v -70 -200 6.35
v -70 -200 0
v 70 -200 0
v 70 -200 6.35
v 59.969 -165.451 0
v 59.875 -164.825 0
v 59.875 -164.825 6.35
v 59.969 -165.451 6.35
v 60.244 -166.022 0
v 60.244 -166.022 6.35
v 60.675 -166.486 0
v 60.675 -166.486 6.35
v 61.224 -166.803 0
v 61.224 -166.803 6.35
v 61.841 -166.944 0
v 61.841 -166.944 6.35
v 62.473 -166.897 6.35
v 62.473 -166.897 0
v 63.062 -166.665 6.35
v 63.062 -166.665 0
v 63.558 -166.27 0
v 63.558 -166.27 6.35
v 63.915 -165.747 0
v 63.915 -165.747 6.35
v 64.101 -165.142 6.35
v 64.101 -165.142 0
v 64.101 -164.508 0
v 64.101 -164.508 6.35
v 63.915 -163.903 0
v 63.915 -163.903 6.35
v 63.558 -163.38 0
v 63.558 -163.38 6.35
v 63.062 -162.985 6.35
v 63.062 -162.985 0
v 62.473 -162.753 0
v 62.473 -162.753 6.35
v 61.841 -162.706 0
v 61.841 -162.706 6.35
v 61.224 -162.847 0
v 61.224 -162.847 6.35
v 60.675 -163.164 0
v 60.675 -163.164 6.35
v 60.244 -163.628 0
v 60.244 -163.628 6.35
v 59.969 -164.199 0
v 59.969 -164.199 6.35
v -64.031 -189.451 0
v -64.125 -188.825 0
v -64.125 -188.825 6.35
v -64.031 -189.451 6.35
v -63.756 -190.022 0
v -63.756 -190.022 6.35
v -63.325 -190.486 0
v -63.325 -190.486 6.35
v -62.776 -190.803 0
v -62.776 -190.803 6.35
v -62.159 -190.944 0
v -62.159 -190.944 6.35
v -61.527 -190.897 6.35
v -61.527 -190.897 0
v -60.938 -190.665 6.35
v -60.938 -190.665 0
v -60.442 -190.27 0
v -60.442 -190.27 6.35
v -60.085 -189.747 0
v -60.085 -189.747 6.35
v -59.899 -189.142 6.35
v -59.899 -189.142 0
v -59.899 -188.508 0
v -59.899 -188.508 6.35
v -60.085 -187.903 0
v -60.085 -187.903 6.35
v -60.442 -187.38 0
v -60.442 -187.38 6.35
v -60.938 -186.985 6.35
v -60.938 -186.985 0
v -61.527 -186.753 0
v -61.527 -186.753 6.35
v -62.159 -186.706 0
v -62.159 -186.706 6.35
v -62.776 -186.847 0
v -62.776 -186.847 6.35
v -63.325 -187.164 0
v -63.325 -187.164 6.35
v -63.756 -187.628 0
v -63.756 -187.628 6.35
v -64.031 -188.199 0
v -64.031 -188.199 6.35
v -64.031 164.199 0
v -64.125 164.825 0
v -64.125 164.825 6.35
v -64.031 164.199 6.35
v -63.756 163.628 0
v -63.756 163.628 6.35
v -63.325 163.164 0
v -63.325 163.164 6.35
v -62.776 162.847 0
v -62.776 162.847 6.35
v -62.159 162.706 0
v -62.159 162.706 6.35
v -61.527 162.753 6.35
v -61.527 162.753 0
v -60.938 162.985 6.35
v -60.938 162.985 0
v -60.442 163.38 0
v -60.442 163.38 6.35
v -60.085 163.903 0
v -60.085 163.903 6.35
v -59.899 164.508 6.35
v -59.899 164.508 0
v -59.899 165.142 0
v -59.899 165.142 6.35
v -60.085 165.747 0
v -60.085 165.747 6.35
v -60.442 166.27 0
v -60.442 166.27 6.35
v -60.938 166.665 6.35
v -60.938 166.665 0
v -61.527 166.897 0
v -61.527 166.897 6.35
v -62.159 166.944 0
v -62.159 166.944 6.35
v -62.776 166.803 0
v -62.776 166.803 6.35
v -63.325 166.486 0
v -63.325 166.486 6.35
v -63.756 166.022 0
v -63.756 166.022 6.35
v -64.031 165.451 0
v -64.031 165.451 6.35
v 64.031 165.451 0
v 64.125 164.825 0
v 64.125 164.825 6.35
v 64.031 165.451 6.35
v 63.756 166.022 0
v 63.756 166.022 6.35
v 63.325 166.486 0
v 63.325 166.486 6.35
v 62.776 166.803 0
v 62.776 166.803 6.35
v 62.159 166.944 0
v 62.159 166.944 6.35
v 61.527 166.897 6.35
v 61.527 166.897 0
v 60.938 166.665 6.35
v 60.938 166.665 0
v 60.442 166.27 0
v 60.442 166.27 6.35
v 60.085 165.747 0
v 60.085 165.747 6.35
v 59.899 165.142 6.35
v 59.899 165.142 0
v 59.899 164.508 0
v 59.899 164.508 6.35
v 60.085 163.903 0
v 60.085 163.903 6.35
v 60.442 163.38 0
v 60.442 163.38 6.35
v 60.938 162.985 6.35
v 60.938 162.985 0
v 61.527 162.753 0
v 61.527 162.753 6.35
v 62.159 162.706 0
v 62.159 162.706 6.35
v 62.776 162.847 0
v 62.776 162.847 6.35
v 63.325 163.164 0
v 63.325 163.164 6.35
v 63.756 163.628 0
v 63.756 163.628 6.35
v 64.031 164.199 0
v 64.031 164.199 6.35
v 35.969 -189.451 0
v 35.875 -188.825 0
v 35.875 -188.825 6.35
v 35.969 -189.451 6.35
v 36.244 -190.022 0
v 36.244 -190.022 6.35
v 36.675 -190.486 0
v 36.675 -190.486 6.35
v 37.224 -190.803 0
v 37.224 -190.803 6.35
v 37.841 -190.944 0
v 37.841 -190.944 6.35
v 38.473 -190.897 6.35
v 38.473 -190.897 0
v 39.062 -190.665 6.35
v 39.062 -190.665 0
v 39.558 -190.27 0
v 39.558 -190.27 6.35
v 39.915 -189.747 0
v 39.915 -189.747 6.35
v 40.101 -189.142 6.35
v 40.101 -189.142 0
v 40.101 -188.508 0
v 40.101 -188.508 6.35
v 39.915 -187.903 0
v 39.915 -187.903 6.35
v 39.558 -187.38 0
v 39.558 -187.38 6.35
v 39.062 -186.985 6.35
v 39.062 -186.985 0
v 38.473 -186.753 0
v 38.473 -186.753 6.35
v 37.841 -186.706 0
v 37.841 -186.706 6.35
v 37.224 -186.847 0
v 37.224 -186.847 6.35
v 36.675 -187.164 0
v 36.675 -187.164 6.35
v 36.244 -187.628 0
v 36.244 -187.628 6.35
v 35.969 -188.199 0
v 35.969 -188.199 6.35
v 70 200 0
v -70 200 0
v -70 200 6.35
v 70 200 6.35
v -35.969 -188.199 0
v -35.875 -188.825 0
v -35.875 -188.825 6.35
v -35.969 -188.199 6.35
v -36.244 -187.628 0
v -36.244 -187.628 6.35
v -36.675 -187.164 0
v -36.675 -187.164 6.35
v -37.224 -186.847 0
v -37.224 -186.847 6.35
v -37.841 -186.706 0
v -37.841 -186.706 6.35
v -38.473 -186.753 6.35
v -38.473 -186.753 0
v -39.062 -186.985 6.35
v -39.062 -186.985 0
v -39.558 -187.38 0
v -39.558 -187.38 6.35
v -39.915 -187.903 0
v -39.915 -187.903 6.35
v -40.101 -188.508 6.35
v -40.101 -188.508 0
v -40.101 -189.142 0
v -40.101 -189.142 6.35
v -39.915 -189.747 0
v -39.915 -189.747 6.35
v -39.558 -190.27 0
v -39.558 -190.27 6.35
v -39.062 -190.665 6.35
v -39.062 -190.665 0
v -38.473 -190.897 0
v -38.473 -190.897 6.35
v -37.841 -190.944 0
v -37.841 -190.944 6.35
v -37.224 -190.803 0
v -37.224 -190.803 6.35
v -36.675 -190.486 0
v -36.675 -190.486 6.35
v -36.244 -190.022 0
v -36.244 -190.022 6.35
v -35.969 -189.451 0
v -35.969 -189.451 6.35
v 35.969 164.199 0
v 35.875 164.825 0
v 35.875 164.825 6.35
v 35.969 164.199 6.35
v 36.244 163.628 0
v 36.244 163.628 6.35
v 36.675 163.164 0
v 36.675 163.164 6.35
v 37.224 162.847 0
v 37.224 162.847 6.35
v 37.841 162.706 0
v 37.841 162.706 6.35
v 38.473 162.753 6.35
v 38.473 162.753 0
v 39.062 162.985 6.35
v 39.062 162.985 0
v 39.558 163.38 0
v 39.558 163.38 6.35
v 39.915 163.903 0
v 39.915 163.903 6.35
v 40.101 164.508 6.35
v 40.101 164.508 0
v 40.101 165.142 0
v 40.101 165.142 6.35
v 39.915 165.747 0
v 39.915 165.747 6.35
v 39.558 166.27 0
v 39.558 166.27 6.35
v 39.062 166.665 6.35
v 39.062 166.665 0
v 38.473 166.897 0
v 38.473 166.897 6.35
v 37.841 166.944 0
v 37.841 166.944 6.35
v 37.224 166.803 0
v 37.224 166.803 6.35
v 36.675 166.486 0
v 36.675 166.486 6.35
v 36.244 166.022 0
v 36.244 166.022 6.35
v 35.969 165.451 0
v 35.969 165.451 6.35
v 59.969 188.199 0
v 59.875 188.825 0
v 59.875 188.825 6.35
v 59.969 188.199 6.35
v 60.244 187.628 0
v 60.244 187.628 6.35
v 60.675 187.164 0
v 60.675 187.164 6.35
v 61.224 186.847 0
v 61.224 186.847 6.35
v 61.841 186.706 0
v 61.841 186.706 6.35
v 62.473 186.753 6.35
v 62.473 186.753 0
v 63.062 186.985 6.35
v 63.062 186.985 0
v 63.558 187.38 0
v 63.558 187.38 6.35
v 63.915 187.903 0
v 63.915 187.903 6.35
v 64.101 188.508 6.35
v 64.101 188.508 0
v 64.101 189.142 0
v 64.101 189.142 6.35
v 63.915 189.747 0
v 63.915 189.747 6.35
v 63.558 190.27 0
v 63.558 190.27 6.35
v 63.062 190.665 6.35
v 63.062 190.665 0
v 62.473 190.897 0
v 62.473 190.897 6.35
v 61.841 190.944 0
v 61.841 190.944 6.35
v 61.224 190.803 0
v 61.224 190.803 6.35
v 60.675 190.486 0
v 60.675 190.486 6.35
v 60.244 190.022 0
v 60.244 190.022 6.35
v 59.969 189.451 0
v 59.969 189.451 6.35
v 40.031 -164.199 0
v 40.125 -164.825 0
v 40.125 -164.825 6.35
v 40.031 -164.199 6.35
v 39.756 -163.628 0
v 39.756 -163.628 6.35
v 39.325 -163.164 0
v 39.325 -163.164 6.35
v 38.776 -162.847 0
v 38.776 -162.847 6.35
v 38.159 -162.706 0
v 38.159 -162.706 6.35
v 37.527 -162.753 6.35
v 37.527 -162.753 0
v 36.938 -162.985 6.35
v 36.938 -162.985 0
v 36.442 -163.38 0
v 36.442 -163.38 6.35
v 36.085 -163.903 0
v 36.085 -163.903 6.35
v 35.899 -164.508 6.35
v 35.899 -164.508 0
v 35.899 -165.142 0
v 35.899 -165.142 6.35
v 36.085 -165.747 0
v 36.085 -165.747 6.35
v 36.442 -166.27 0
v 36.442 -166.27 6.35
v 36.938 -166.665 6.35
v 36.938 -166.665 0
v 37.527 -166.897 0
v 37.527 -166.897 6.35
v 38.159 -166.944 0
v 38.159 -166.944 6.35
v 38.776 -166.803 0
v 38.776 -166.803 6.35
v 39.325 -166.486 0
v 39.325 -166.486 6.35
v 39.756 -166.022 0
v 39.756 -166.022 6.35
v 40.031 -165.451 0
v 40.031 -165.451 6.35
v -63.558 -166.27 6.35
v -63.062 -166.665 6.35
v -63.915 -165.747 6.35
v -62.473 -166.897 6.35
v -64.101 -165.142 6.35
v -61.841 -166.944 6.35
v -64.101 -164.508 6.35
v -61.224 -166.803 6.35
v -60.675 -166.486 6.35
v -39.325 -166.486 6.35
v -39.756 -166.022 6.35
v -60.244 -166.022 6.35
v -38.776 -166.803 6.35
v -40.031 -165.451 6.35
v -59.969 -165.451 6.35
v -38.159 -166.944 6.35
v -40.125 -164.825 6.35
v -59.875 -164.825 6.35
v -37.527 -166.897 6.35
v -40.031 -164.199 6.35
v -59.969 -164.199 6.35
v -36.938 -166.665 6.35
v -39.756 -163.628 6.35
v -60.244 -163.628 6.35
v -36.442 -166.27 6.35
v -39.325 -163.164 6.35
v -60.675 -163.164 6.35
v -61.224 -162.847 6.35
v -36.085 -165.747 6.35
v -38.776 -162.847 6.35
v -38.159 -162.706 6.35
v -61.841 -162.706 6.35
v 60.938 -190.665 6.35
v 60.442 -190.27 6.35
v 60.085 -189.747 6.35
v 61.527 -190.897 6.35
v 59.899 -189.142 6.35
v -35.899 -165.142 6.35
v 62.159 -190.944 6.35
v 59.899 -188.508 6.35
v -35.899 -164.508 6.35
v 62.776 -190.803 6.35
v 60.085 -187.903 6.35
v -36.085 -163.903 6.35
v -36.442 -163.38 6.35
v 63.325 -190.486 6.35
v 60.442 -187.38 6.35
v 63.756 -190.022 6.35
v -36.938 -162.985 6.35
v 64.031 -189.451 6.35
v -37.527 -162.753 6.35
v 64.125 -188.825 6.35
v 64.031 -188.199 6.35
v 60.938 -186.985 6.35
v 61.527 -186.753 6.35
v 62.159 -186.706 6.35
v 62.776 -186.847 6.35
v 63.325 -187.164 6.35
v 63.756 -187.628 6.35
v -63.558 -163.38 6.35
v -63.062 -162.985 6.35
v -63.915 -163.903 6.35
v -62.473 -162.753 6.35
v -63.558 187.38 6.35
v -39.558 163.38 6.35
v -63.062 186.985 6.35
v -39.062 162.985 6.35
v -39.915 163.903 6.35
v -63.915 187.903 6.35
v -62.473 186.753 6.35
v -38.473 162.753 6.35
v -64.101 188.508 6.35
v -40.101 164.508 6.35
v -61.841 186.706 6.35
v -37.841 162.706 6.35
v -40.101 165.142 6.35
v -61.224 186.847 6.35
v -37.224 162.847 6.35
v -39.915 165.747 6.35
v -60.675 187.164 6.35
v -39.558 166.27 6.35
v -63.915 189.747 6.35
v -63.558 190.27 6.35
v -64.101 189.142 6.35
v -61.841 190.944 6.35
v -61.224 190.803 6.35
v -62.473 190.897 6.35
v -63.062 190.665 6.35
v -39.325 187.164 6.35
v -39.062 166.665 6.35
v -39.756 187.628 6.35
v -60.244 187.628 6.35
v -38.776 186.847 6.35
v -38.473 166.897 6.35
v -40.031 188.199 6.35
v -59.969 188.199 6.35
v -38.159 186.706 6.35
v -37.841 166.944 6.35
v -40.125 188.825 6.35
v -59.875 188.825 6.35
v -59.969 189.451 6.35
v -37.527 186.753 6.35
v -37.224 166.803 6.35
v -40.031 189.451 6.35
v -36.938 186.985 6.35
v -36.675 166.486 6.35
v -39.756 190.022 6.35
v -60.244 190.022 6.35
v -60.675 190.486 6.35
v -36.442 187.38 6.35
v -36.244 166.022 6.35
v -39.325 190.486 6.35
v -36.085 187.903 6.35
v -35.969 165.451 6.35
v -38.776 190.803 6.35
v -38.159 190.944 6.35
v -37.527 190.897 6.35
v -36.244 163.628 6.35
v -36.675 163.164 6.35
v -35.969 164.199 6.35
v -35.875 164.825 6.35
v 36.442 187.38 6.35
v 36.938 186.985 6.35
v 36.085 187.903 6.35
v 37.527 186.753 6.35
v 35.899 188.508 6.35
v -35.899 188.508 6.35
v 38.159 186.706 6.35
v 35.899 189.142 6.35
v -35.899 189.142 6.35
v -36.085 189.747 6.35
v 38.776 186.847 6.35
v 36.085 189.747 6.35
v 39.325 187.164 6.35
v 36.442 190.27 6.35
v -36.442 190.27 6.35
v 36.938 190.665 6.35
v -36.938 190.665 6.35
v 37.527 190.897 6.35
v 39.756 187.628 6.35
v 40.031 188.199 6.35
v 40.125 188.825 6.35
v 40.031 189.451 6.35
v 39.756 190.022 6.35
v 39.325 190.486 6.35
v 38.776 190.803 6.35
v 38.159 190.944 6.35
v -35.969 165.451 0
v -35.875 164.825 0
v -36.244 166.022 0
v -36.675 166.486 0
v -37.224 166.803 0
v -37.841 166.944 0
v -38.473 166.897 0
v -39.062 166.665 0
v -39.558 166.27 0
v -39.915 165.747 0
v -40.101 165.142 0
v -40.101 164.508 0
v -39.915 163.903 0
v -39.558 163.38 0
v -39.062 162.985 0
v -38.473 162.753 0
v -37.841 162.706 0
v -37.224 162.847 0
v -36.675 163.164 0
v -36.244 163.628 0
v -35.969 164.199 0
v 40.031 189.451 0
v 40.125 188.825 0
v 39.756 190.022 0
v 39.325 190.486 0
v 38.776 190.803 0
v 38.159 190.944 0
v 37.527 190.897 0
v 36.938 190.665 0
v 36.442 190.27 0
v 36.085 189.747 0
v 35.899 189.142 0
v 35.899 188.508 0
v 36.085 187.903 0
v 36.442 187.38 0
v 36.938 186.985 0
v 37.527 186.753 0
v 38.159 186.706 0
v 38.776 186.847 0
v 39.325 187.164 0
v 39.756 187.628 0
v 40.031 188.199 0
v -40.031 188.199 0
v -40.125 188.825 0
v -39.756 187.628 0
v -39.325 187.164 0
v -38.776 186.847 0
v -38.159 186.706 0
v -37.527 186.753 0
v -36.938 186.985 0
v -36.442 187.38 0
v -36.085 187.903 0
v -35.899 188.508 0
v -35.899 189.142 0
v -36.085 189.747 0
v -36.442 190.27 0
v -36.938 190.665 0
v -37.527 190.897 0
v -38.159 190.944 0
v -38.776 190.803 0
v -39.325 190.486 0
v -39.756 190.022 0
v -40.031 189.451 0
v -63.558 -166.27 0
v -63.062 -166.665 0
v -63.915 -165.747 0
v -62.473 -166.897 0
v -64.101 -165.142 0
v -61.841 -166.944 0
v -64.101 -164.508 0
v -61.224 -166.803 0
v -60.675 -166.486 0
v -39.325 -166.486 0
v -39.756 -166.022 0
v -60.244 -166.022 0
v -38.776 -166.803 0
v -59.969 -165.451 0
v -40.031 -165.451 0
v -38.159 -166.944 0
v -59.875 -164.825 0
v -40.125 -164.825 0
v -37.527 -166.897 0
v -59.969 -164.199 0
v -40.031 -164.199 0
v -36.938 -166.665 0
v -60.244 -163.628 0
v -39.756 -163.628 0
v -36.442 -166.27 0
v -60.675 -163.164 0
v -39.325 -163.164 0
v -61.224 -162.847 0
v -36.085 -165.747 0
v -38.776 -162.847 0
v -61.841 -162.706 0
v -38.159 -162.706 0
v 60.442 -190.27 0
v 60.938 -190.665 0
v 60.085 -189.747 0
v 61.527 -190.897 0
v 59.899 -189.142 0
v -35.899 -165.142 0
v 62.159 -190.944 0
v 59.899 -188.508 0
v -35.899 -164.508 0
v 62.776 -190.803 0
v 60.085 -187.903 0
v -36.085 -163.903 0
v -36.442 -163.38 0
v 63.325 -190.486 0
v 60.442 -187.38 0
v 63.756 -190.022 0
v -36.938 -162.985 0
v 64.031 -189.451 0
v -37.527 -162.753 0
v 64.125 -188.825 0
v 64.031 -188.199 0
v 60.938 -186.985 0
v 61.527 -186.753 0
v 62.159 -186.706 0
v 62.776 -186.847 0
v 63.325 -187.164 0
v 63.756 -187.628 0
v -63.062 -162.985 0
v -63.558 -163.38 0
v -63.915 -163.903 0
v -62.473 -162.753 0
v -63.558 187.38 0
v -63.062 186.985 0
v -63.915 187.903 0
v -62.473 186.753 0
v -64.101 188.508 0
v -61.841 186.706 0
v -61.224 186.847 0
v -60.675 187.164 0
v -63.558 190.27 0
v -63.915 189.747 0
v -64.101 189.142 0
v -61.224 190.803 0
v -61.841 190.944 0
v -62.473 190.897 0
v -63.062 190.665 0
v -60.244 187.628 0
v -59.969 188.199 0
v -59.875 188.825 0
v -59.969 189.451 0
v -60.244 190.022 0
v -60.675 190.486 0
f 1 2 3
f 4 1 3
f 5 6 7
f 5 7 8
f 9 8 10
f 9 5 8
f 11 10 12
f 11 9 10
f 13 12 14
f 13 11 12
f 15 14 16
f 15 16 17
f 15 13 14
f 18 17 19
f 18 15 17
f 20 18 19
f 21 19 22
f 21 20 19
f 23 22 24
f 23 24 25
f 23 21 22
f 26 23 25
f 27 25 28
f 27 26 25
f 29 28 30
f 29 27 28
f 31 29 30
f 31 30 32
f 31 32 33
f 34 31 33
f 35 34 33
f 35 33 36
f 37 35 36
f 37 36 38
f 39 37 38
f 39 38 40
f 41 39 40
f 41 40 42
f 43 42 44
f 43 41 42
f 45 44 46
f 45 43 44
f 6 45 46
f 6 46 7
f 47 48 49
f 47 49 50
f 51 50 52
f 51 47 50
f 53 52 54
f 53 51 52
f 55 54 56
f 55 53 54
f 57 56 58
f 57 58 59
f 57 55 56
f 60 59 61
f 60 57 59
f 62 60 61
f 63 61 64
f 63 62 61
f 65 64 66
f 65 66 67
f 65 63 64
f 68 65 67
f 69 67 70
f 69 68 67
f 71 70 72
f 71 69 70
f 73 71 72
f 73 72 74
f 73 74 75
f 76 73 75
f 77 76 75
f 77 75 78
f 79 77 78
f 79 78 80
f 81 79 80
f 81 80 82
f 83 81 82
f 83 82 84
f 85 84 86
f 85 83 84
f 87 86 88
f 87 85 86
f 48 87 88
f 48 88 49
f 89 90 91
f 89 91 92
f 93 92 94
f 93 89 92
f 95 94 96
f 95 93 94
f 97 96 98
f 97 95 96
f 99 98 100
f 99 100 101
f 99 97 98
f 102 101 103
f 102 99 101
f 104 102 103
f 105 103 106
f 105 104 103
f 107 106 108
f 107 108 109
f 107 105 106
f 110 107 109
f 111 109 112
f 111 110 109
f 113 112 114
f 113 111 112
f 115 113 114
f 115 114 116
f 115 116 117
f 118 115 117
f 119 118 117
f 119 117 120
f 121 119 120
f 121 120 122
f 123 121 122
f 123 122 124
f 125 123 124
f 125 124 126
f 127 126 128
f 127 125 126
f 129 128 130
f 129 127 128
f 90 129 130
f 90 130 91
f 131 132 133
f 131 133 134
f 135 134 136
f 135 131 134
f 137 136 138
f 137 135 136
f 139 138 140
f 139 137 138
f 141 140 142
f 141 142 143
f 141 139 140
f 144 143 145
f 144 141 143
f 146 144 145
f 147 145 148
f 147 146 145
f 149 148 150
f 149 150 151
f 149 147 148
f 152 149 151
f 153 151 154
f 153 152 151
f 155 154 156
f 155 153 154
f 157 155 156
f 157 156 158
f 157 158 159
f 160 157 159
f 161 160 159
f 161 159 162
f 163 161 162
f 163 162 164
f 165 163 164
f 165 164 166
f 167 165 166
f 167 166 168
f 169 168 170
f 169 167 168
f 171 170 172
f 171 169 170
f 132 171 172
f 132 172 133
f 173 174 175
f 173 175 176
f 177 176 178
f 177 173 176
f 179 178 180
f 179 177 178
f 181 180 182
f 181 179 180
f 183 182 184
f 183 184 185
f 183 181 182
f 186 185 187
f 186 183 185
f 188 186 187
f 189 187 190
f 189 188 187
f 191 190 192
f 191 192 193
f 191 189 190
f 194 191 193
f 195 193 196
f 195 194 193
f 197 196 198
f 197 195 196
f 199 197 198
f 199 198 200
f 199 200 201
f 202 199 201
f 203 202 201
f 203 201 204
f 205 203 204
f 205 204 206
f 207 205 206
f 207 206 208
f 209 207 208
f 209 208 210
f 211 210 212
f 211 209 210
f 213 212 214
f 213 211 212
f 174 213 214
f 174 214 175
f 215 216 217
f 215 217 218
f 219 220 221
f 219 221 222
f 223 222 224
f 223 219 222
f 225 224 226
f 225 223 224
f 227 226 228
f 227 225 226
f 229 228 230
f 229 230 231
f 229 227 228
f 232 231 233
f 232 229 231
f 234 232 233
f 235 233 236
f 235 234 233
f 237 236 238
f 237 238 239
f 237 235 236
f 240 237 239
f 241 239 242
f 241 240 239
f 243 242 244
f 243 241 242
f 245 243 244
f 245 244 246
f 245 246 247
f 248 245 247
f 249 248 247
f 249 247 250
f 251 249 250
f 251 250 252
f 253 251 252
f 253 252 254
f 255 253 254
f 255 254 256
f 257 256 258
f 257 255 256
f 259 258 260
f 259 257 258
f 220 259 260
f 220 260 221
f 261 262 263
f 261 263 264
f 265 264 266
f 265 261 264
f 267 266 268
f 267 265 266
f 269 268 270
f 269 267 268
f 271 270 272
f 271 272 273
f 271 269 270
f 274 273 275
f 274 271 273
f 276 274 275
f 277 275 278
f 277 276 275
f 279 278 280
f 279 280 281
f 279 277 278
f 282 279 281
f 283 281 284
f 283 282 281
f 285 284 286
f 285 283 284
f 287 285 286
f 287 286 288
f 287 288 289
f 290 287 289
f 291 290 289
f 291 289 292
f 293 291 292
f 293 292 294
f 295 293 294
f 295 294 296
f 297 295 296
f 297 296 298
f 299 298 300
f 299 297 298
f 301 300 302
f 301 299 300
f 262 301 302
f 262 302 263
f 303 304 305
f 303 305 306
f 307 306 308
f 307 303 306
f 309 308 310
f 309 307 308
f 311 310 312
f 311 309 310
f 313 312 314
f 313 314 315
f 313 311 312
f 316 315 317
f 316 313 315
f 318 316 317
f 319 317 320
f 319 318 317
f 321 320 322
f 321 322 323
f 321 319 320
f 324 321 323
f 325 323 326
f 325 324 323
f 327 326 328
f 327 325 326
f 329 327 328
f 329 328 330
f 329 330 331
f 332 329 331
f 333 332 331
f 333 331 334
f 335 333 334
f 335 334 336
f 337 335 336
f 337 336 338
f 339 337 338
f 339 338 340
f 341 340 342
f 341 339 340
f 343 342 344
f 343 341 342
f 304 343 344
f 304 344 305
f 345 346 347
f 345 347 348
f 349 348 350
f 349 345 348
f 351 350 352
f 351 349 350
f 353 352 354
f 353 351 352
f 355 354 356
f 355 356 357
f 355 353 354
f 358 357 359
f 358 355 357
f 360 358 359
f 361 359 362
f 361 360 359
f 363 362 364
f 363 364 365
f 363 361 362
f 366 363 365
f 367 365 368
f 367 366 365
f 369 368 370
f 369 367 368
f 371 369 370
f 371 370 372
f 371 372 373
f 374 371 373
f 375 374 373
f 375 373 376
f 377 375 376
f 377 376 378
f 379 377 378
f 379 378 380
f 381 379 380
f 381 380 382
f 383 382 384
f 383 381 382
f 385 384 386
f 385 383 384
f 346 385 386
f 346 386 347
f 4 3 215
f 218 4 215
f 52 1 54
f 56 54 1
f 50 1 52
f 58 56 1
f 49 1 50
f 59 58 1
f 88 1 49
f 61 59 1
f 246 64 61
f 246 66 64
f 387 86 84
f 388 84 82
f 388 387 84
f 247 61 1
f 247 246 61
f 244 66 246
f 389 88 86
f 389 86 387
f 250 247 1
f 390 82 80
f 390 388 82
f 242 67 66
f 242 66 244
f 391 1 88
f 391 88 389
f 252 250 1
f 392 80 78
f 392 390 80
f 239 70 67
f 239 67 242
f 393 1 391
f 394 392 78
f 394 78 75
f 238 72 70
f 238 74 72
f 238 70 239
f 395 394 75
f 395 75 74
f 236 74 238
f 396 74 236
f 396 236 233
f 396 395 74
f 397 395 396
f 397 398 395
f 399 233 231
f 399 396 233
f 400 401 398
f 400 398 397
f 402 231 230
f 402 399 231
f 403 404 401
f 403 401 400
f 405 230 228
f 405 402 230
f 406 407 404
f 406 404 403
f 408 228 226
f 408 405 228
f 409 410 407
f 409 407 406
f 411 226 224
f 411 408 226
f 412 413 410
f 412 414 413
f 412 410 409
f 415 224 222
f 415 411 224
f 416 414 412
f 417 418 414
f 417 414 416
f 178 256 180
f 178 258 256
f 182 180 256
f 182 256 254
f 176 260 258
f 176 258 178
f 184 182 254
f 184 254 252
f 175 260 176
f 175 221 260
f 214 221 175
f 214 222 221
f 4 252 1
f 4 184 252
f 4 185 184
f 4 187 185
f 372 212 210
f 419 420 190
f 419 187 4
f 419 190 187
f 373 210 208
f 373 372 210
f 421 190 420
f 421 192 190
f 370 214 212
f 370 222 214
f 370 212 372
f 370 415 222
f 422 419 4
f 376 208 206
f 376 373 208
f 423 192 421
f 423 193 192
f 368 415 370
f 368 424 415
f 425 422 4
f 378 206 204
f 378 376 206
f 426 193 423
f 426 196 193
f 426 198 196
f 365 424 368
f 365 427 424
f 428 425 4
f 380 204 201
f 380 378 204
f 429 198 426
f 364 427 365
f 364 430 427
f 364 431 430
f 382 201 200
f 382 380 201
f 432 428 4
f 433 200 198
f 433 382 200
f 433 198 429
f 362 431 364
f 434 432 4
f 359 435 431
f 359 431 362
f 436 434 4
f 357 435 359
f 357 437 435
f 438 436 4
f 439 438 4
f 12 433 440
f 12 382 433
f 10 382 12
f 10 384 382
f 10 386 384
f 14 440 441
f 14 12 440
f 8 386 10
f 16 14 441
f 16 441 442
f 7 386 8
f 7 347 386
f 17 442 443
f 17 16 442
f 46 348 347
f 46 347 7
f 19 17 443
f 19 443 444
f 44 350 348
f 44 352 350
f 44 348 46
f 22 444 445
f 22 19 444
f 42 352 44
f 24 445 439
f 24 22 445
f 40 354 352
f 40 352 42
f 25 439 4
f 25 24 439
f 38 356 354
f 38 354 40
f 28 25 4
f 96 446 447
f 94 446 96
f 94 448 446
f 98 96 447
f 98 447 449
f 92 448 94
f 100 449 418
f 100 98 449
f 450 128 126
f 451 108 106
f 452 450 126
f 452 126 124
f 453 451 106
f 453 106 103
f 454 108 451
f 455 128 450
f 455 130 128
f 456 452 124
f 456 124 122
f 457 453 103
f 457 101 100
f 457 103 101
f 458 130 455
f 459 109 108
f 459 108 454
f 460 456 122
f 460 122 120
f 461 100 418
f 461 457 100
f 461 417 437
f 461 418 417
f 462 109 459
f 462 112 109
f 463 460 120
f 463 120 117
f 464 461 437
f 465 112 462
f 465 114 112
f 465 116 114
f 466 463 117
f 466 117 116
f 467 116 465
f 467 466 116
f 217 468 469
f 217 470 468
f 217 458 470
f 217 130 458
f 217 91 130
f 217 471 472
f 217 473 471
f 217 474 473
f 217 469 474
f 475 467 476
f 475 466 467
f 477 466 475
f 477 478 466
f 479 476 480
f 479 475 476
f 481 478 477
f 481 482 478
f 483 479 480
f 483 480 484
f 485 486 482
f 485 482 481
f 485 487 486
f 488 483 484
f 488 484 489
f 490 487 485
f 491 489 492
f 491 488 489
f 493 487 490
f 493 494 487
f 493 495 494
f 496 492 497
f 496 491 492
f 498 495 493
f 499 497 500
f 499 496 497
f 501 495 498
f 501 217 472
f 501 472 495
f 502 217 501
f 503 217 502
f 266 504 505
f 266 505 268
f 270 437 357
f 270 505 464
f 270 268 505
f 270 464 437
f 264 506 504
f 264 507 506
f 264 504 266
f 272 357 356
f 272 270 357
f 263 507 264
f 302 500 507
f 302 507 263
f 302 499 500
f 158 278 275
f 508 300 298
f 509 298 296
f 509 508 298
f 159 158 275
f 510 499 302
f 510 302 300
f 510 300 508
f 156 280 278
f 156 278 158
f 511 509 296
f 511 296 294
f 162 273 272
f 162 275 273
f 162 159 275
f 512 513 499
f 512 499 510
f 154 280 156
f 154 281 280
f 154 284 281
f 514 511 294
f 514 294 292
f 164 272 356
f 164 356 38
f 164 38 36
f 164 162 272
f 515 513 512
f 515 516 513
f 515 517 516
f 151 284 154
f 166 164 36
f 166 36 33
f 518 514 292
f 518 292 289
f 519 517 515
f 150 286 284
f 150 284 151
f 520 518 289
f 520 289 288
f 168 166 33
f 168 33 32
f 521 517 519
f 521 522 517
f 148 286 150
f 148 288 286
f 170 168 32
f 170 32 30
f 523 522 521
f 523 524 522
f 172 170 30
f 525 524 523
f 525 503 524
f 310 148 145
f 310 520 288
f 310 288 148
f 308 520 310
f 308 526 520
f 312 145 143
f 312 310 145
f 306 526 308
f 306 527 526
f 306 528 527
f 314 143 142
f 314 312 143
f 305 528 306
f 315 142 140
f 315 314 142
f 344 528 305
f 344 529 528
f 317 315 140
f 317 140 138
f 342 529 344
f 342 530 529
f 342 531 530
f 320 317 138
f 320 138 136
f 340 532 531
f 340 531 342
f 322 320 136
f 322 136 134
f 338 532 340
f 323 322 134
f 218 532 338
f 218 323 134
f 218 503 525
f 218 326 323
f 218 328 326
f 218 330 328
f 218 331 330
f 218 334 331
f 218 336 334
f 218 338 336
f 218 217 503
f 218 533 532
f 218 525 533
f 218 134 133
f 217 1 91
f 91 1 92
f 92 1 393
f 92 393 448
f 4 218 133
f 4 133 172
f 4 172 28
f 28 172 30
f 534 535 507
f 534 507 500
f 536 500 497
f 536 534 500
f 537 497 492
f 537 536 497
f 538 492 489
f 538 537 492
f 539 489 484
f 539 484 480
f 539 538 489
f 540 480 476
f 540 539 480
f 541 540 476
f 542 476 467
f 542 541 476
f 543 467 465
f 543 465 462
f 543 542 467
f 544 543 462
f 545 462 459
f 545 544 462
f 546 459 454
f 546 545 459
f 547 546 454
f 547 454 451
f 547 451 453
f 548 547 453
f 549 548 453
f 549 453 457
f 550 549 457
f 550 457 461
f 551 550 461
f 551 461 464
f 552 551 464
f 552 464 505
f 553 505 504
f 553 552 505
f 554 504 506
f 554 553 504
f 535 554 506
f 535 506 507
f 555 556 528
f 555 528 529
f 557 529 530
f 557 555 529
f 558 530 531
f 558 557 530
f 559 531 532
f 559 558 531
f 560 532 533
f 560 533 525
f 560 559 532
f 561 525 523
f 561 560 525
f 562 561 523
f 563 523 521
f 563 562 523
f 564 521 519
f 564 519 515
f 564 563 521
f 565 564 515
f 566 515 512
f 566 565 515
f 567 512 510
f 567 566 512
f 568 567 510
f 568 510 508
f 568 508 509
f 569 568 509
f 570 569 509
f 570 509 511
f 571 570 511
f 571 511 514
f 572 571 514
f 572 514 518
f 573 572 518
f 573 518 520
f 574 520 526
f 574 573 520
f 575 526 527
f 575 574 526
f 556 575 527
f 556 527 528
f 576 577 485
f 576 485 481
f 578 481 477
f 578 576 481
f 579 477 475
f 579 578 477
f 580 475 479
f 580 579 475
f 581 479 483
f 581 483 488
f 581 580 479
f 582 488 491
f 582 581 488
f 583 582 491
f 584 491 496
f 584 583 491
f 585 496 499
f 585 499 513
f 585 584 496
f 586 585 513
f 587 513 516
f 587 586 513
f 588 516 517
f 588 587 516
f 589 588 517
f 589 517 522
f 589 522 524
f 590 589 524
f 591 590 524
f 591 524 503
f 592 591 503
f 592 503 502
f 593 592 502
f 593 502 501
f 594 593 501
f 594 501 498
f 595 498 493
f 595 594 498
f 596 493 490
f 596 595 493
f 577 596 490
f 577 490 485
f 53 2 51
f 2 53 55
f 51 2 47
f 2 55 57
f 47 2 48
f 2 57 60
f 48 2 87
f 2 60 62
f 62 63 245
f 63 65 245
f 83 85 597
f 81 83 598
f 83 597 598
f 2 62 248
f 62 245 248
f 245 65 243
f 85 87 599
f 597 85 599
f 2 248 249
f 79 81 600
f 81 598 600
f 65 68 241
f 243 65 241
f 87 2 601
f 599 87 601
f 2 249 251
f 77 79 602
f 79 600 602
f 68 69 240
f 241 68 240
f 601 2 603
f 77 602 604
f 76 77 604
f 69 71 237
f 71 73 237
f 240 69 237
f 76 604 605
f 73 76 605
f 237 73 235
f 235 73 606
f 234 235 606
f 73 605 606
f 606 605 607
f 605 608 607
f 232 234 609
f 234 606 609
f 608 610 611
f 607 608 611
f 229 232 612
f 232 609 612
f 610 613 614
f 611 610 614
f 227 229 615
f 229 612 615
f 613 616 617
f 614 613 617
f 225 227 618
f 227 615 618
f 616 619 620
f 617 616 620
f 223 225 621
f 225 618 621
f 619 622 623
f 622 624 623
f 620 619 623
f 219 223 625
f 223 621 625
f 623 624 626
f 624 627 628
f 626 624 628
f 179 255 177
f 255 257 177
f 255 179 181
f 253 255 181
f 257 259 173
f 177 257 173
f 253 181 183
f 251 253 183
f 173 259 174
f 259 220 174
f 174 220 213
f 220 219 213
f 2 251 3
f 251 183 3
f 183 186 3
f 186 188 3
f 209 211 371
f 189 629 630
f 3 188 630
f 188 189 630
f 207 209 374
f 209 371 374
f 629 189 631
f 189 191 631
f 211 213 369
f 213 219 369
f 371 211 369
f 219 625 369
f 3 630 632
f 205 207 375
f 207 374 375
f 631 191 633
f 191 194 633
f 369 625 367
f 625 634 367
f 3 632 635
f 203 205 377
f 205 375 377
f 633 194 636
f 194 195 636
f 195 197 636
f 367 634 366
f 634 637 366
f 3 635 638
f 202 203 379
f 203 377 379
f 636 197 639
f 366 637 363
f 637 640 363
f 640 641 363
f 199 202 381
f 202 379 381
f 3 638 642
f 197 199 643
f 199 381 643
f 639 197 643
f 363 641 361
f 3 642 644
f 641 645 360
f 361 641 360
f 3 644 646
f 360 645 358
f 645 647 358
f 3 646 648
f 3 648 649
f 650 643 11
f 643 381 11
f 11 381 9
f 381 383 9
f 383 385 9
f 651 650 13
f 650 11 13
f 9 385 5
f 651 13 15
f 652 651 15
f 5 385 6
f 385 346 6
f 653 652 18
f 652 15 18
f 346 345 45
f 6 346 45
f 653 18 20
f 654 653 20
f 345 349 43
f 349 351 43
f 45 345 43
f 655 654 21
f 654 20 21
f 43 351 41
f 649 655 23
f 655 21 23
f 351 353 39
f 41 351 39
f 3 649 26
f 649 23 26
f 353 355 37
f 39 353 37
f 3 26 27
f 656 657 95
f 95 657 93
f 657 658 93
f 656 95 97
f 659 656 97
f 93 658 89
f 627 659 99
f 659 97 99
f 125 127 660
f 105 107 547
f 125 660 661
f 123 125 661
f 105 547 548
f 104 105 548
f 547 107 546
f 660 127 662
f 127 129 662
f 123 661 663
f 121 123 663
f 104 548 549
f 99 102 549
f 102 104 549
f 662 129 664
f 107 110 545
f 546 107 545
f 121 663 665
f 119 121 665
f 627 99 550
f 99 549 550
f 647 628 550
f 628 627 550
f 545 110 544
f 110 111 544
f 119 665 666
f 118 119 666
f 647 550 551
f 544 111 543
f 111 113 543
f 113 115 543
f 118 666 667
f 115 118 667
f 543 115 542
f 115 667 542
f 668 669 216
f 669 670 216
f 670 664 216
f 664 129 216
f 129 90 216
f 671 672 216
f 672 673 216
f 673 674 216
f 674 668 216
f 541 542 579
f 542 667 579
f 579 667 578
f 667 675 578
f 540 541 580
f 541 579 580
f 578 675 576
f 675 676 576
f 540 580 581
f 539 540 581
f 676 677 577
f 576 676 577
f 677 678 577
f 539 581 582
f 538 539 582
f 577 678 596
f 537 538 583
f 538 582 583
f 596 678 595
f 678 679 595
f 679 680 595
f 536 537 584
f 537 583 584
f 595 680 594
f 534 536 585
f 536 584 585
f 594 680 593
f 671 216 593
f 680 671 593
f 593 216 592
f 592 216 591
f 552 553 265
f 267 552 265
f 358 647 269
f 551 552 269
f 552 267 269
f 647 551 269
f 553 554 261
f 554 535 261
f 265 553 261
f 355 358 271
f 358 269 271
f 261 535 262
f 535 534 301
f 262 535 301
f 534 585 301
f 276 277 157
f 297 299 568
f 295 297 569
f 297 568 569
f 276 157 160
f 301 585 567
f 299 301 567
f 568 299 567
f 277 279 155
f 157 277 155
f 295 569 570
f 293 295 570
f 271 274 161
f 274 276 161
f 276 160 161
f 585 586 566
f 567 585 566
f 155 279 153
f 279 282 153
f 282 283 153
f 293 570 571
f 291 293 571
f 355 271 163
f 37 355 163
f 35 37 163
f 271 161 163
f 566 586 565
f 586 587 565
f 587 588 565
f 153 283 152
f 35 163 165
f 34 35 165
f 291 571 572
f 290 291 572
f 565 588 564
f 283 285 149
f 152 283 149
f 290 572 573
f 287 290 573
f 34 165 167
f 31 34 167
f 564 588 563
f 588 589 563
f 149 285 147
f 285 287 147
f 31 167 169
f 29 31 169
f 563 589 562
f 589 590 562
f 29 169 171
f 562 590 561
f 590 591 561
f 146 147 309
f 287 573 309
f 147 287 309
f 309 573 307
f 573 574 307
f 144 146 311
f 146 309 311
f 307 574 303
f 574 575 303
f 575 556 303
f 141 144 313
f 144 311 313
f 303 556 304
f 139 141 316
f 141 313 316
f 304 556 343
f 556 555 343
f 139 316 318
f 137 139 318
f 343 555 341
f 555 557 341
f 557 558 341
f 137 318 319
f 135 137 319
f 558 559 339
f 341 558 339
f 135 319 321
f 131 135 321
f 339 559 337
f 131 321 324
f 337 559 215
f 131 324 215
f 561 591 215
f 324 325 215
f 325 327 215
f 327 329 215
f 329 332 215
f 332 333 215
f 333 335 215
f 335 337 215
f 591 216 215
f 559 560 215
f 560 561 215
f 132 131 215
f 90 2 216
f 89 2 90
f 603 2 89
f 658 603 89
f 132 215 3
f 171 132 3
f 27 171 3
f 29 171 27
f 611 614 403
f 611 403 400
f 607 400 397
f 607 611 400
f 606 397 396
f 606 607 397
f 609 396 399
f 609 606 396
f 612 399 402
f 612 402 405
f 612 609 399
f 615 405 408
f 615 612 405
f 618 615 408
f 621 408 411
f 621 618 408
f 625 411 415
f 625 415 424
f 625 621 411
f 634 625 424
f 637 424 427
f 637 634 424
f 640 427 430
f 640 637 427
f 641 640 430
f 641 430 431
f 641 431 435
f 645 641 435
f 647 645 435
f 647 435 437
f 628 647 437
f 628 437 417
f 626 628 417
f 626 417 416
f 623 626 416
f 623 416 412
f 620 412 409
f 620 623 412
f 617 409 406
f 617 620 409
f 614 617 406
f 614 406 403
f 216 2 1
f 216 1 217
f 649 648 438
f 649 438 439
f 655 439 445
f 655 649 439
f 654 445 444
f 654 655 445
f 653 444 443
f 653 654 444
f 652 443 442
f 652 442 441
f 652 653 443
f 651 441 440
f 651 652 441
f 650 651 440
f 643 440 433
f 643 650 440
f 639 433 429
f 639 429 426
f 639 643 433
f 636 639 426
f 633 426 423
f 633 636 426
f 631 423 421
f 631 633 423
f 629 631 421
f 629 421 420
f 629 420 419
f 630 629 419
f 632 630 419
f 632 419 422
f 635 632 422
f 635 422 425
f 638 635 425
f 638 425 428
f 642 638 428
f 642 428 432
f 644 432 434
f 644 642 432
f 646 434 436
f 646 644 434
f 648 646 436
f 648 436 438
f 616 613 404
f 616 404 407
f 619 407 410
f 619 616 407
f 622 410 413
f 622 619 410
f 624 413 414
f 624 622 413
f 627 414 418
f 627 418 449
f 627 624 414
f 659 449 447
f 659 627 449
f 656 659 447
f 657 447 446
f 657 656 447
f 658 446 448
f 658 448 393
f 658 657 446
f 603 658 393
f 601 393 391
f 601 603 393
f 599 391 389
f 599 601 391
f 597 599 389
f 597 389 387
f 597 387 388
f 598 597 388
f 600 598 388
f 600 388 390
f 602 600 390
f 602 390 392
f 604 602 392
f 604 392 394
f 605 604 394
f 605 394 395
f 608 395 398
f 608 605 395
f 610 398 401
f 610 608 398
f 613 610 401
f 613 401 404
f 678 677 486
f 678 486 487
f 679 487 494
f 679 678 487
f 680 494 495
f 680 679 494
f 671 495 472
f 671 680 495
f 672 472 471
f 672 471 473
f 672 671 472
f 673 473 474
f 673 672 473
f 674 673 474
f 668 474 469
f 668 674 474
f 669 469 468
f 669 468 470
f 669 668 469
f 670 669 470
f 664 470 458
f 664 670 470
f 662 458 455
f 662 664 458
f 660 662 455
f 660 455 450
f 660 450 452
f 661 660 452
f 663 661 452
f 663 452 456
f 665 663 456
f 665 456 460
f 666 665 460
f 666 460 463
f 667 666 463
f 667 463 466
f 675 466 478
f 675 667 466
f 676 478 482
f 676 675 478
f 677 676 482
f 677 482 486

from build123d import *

# Parameters (mm, degrees)
SKETCH1_W           = 140
SKETCH1_H           = 400
SKETCH1_R           = 2.125
BOSS_EXTRUDE1_DEPTH = 6.35


with BuildPart() as part:
    # Sketch1 → Boss-Extrude1 (new body)
    with BuildSketch(Plane.XY):
        Rectangle(SKETCH1_W, SKETCH1_H)
        with Locations((-62, 188.825)):
            Circle(SKETCH1_R, mode=Mode.SUBTRACT)
        with Locations(Location((-38, 188.825, 0), (0, 0, 180))):
            Circle(SKETCH1_R, mode=Mode.SUBTRACT)
        with Locations((-38, 164.825)):
            Circle(SKETCH1_R, mode=Mode.SUBTRACT)
        with Locations(Location((-62, 164.825, 0), (0, 0, 180))):
            Circle(SKETCH1_R, mode=Mode.SUBTRACT)
        with Locations(Location((38, 164.825, 0), (0, 0, 180))):
            Circle(SKETCH1_R, mode=Mode.SUBTRACT)
        with Locations((62, 164.825)):
            Circle(SKETCH1_R, mode=Mode.SUBTRACT)
        with Locations((38, 188.825)):
            Circle(SKETCH1_R, mode=Mode.SUBTRACT)
        with Locations(Location((62, 188.825, 0), (0, 0, 180))):
            Circle(SKETCH1_R, mode=Mode.SUBTRACT)
        with Locations((62, -188.825)):
            Circle(SKETCH1_R, mode=Mode.SUBTRACT)
        with Locations(Location((38, -188.825, 0), (0, 0, 180))):
            Circle(SKETCH1_R, mode=Mode.SUBTRACT)
        with Locations(Location((62, -164.825, 0), (0, 0, 180))):
            Circle(SKETCH1_R, mode=Mode.SUBTRACT)
        with Locations((38, -164.825)):
            Circle(SKETCH1_R, mode=Mode.SUBTRACT)
        with Locations((-62, -164.825)):
            Circle(SKETCH1_R, mode=Mode.SUBTRACT)
        with Locations(Location((-38, -164.825, 0), (0, 0, 180))):
            Circle(SKETCH1_R, mode=Mode.SUBTRACT)
        with Locations((-38, -188.825)):
            Circle(SKETCH1_R, mode=Mode.SUBTRACT)
        with Locations(Location((-62, -188.825, 0), (0, 0, 180))):
            Circle(SKETCH1_R, mode=Mode.SUBTRACT)
    extrude(amount=BOSS_EXTRUDE1_DEPTH)


solid = part.part
